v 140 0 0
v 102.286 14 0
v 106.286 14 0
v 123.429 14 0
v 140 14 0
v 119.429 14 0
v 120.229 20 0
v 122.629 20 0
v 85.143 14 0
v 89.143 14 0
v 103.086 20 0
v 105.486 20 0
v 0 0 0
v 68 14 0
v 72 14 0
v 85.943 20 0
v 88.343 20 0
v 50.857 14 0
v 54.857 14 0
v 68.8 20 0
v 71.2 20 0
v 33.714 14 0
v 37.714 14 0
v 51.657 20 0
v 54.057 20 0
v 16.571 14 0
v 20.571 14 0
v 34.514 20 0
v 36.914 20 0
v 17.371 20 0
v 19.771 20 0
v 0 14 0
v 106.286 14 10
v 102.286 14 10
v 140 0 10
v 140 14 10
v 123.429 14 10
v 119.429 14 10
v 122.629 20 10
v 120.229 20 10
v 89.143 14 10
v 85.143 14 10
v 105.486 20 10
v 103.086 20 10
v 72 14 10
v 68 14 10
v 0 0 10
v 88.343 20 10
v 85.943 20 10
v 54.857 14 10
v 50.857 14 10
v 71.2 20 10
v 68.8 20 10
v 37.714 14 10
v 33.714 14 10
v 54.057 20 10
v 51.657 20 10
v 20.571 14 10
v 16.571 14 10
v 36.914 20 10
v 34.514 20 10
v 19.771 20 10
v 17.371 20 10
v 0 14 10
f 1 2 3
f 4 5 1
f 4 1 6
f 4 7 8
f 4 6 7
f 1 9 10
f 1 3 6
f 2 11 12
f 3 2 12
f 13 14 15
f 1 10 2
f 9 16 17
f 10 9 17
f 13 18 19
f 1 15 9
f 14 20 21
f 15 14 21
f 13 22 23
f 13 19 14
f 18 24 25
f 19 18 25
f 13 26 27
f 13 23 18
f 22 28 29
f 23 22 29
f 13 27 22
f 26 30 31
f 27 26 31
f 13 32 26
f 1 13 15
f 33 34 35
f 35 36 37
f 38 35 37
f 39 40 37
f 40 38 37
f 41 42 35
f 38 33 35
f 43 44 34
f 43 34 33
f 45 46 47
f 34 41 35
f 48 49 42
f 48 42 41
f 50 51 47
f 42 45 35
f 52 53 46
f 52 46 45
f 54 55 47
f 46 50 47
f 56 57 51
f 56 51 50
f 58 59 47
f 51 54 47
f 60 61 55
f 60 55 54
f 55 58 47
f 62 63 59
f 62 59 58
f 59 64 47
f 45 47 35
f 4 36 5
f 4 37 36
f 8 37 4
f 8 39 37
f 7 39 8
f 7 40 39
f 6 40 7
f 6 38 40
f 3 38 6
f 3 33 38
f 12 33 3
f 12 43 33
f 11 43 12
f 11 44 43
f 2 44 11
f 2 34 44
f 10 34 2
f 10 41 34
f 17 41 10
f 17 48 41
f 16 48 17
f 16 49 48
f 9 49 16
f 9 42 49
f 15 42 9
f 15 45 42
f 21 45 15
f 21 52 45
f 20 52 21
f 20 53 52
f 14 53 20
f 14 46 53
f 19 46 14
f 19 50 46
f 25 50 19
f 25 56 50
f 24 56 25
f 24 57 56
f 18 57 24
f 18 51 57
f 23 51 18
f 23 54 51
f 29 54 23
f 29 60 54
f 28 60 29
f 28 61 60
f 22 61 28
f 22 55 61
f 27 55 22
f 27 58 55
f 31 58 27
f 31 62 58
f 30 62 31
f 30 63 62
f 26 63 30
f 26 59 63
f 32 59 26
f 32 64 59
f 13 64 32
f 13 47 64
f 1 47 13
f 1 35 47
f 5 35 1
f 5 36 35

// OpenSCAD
$fn = 32;

// ----------------------------------------------------------------------
// Gear rack: 7 teeth on a 140 mm bar, pitch 17.14 mm
// ----------------------------------------------------------------------

// --- parameters (mm) ---
profile_height = 10;      // extrusion height
profile_points = 32;      // points of the closed outline

profile = [[0, 0], [140, 0], [140, 14], [123.429, 14], [122.629, 20], [120.229, 20], [119.429, 14], [106.286, 14], [105.486, 20], [103.086, 20], [102.286, 14], [89.143, 14], [88.343, 20], [85.943, 20], [85.143, 14], [72, 14], [71.2, 20], [68.8, 20], [68, 14], [54.857, 14], [54.057, 20], [51.657, 20], [50.857, 14], [37.714, 14], [36.914, 20], [34.514, 20], [33.714, 14], [20.571, 14], [19.771, 20], [17.371, 20], [16.571, 14], [0, 14]];  // single closed polygon, 32 points, counter clockwise

// --- the one profile operation ---
linear_extrude(height = profile_height) polygon(points = profile);
